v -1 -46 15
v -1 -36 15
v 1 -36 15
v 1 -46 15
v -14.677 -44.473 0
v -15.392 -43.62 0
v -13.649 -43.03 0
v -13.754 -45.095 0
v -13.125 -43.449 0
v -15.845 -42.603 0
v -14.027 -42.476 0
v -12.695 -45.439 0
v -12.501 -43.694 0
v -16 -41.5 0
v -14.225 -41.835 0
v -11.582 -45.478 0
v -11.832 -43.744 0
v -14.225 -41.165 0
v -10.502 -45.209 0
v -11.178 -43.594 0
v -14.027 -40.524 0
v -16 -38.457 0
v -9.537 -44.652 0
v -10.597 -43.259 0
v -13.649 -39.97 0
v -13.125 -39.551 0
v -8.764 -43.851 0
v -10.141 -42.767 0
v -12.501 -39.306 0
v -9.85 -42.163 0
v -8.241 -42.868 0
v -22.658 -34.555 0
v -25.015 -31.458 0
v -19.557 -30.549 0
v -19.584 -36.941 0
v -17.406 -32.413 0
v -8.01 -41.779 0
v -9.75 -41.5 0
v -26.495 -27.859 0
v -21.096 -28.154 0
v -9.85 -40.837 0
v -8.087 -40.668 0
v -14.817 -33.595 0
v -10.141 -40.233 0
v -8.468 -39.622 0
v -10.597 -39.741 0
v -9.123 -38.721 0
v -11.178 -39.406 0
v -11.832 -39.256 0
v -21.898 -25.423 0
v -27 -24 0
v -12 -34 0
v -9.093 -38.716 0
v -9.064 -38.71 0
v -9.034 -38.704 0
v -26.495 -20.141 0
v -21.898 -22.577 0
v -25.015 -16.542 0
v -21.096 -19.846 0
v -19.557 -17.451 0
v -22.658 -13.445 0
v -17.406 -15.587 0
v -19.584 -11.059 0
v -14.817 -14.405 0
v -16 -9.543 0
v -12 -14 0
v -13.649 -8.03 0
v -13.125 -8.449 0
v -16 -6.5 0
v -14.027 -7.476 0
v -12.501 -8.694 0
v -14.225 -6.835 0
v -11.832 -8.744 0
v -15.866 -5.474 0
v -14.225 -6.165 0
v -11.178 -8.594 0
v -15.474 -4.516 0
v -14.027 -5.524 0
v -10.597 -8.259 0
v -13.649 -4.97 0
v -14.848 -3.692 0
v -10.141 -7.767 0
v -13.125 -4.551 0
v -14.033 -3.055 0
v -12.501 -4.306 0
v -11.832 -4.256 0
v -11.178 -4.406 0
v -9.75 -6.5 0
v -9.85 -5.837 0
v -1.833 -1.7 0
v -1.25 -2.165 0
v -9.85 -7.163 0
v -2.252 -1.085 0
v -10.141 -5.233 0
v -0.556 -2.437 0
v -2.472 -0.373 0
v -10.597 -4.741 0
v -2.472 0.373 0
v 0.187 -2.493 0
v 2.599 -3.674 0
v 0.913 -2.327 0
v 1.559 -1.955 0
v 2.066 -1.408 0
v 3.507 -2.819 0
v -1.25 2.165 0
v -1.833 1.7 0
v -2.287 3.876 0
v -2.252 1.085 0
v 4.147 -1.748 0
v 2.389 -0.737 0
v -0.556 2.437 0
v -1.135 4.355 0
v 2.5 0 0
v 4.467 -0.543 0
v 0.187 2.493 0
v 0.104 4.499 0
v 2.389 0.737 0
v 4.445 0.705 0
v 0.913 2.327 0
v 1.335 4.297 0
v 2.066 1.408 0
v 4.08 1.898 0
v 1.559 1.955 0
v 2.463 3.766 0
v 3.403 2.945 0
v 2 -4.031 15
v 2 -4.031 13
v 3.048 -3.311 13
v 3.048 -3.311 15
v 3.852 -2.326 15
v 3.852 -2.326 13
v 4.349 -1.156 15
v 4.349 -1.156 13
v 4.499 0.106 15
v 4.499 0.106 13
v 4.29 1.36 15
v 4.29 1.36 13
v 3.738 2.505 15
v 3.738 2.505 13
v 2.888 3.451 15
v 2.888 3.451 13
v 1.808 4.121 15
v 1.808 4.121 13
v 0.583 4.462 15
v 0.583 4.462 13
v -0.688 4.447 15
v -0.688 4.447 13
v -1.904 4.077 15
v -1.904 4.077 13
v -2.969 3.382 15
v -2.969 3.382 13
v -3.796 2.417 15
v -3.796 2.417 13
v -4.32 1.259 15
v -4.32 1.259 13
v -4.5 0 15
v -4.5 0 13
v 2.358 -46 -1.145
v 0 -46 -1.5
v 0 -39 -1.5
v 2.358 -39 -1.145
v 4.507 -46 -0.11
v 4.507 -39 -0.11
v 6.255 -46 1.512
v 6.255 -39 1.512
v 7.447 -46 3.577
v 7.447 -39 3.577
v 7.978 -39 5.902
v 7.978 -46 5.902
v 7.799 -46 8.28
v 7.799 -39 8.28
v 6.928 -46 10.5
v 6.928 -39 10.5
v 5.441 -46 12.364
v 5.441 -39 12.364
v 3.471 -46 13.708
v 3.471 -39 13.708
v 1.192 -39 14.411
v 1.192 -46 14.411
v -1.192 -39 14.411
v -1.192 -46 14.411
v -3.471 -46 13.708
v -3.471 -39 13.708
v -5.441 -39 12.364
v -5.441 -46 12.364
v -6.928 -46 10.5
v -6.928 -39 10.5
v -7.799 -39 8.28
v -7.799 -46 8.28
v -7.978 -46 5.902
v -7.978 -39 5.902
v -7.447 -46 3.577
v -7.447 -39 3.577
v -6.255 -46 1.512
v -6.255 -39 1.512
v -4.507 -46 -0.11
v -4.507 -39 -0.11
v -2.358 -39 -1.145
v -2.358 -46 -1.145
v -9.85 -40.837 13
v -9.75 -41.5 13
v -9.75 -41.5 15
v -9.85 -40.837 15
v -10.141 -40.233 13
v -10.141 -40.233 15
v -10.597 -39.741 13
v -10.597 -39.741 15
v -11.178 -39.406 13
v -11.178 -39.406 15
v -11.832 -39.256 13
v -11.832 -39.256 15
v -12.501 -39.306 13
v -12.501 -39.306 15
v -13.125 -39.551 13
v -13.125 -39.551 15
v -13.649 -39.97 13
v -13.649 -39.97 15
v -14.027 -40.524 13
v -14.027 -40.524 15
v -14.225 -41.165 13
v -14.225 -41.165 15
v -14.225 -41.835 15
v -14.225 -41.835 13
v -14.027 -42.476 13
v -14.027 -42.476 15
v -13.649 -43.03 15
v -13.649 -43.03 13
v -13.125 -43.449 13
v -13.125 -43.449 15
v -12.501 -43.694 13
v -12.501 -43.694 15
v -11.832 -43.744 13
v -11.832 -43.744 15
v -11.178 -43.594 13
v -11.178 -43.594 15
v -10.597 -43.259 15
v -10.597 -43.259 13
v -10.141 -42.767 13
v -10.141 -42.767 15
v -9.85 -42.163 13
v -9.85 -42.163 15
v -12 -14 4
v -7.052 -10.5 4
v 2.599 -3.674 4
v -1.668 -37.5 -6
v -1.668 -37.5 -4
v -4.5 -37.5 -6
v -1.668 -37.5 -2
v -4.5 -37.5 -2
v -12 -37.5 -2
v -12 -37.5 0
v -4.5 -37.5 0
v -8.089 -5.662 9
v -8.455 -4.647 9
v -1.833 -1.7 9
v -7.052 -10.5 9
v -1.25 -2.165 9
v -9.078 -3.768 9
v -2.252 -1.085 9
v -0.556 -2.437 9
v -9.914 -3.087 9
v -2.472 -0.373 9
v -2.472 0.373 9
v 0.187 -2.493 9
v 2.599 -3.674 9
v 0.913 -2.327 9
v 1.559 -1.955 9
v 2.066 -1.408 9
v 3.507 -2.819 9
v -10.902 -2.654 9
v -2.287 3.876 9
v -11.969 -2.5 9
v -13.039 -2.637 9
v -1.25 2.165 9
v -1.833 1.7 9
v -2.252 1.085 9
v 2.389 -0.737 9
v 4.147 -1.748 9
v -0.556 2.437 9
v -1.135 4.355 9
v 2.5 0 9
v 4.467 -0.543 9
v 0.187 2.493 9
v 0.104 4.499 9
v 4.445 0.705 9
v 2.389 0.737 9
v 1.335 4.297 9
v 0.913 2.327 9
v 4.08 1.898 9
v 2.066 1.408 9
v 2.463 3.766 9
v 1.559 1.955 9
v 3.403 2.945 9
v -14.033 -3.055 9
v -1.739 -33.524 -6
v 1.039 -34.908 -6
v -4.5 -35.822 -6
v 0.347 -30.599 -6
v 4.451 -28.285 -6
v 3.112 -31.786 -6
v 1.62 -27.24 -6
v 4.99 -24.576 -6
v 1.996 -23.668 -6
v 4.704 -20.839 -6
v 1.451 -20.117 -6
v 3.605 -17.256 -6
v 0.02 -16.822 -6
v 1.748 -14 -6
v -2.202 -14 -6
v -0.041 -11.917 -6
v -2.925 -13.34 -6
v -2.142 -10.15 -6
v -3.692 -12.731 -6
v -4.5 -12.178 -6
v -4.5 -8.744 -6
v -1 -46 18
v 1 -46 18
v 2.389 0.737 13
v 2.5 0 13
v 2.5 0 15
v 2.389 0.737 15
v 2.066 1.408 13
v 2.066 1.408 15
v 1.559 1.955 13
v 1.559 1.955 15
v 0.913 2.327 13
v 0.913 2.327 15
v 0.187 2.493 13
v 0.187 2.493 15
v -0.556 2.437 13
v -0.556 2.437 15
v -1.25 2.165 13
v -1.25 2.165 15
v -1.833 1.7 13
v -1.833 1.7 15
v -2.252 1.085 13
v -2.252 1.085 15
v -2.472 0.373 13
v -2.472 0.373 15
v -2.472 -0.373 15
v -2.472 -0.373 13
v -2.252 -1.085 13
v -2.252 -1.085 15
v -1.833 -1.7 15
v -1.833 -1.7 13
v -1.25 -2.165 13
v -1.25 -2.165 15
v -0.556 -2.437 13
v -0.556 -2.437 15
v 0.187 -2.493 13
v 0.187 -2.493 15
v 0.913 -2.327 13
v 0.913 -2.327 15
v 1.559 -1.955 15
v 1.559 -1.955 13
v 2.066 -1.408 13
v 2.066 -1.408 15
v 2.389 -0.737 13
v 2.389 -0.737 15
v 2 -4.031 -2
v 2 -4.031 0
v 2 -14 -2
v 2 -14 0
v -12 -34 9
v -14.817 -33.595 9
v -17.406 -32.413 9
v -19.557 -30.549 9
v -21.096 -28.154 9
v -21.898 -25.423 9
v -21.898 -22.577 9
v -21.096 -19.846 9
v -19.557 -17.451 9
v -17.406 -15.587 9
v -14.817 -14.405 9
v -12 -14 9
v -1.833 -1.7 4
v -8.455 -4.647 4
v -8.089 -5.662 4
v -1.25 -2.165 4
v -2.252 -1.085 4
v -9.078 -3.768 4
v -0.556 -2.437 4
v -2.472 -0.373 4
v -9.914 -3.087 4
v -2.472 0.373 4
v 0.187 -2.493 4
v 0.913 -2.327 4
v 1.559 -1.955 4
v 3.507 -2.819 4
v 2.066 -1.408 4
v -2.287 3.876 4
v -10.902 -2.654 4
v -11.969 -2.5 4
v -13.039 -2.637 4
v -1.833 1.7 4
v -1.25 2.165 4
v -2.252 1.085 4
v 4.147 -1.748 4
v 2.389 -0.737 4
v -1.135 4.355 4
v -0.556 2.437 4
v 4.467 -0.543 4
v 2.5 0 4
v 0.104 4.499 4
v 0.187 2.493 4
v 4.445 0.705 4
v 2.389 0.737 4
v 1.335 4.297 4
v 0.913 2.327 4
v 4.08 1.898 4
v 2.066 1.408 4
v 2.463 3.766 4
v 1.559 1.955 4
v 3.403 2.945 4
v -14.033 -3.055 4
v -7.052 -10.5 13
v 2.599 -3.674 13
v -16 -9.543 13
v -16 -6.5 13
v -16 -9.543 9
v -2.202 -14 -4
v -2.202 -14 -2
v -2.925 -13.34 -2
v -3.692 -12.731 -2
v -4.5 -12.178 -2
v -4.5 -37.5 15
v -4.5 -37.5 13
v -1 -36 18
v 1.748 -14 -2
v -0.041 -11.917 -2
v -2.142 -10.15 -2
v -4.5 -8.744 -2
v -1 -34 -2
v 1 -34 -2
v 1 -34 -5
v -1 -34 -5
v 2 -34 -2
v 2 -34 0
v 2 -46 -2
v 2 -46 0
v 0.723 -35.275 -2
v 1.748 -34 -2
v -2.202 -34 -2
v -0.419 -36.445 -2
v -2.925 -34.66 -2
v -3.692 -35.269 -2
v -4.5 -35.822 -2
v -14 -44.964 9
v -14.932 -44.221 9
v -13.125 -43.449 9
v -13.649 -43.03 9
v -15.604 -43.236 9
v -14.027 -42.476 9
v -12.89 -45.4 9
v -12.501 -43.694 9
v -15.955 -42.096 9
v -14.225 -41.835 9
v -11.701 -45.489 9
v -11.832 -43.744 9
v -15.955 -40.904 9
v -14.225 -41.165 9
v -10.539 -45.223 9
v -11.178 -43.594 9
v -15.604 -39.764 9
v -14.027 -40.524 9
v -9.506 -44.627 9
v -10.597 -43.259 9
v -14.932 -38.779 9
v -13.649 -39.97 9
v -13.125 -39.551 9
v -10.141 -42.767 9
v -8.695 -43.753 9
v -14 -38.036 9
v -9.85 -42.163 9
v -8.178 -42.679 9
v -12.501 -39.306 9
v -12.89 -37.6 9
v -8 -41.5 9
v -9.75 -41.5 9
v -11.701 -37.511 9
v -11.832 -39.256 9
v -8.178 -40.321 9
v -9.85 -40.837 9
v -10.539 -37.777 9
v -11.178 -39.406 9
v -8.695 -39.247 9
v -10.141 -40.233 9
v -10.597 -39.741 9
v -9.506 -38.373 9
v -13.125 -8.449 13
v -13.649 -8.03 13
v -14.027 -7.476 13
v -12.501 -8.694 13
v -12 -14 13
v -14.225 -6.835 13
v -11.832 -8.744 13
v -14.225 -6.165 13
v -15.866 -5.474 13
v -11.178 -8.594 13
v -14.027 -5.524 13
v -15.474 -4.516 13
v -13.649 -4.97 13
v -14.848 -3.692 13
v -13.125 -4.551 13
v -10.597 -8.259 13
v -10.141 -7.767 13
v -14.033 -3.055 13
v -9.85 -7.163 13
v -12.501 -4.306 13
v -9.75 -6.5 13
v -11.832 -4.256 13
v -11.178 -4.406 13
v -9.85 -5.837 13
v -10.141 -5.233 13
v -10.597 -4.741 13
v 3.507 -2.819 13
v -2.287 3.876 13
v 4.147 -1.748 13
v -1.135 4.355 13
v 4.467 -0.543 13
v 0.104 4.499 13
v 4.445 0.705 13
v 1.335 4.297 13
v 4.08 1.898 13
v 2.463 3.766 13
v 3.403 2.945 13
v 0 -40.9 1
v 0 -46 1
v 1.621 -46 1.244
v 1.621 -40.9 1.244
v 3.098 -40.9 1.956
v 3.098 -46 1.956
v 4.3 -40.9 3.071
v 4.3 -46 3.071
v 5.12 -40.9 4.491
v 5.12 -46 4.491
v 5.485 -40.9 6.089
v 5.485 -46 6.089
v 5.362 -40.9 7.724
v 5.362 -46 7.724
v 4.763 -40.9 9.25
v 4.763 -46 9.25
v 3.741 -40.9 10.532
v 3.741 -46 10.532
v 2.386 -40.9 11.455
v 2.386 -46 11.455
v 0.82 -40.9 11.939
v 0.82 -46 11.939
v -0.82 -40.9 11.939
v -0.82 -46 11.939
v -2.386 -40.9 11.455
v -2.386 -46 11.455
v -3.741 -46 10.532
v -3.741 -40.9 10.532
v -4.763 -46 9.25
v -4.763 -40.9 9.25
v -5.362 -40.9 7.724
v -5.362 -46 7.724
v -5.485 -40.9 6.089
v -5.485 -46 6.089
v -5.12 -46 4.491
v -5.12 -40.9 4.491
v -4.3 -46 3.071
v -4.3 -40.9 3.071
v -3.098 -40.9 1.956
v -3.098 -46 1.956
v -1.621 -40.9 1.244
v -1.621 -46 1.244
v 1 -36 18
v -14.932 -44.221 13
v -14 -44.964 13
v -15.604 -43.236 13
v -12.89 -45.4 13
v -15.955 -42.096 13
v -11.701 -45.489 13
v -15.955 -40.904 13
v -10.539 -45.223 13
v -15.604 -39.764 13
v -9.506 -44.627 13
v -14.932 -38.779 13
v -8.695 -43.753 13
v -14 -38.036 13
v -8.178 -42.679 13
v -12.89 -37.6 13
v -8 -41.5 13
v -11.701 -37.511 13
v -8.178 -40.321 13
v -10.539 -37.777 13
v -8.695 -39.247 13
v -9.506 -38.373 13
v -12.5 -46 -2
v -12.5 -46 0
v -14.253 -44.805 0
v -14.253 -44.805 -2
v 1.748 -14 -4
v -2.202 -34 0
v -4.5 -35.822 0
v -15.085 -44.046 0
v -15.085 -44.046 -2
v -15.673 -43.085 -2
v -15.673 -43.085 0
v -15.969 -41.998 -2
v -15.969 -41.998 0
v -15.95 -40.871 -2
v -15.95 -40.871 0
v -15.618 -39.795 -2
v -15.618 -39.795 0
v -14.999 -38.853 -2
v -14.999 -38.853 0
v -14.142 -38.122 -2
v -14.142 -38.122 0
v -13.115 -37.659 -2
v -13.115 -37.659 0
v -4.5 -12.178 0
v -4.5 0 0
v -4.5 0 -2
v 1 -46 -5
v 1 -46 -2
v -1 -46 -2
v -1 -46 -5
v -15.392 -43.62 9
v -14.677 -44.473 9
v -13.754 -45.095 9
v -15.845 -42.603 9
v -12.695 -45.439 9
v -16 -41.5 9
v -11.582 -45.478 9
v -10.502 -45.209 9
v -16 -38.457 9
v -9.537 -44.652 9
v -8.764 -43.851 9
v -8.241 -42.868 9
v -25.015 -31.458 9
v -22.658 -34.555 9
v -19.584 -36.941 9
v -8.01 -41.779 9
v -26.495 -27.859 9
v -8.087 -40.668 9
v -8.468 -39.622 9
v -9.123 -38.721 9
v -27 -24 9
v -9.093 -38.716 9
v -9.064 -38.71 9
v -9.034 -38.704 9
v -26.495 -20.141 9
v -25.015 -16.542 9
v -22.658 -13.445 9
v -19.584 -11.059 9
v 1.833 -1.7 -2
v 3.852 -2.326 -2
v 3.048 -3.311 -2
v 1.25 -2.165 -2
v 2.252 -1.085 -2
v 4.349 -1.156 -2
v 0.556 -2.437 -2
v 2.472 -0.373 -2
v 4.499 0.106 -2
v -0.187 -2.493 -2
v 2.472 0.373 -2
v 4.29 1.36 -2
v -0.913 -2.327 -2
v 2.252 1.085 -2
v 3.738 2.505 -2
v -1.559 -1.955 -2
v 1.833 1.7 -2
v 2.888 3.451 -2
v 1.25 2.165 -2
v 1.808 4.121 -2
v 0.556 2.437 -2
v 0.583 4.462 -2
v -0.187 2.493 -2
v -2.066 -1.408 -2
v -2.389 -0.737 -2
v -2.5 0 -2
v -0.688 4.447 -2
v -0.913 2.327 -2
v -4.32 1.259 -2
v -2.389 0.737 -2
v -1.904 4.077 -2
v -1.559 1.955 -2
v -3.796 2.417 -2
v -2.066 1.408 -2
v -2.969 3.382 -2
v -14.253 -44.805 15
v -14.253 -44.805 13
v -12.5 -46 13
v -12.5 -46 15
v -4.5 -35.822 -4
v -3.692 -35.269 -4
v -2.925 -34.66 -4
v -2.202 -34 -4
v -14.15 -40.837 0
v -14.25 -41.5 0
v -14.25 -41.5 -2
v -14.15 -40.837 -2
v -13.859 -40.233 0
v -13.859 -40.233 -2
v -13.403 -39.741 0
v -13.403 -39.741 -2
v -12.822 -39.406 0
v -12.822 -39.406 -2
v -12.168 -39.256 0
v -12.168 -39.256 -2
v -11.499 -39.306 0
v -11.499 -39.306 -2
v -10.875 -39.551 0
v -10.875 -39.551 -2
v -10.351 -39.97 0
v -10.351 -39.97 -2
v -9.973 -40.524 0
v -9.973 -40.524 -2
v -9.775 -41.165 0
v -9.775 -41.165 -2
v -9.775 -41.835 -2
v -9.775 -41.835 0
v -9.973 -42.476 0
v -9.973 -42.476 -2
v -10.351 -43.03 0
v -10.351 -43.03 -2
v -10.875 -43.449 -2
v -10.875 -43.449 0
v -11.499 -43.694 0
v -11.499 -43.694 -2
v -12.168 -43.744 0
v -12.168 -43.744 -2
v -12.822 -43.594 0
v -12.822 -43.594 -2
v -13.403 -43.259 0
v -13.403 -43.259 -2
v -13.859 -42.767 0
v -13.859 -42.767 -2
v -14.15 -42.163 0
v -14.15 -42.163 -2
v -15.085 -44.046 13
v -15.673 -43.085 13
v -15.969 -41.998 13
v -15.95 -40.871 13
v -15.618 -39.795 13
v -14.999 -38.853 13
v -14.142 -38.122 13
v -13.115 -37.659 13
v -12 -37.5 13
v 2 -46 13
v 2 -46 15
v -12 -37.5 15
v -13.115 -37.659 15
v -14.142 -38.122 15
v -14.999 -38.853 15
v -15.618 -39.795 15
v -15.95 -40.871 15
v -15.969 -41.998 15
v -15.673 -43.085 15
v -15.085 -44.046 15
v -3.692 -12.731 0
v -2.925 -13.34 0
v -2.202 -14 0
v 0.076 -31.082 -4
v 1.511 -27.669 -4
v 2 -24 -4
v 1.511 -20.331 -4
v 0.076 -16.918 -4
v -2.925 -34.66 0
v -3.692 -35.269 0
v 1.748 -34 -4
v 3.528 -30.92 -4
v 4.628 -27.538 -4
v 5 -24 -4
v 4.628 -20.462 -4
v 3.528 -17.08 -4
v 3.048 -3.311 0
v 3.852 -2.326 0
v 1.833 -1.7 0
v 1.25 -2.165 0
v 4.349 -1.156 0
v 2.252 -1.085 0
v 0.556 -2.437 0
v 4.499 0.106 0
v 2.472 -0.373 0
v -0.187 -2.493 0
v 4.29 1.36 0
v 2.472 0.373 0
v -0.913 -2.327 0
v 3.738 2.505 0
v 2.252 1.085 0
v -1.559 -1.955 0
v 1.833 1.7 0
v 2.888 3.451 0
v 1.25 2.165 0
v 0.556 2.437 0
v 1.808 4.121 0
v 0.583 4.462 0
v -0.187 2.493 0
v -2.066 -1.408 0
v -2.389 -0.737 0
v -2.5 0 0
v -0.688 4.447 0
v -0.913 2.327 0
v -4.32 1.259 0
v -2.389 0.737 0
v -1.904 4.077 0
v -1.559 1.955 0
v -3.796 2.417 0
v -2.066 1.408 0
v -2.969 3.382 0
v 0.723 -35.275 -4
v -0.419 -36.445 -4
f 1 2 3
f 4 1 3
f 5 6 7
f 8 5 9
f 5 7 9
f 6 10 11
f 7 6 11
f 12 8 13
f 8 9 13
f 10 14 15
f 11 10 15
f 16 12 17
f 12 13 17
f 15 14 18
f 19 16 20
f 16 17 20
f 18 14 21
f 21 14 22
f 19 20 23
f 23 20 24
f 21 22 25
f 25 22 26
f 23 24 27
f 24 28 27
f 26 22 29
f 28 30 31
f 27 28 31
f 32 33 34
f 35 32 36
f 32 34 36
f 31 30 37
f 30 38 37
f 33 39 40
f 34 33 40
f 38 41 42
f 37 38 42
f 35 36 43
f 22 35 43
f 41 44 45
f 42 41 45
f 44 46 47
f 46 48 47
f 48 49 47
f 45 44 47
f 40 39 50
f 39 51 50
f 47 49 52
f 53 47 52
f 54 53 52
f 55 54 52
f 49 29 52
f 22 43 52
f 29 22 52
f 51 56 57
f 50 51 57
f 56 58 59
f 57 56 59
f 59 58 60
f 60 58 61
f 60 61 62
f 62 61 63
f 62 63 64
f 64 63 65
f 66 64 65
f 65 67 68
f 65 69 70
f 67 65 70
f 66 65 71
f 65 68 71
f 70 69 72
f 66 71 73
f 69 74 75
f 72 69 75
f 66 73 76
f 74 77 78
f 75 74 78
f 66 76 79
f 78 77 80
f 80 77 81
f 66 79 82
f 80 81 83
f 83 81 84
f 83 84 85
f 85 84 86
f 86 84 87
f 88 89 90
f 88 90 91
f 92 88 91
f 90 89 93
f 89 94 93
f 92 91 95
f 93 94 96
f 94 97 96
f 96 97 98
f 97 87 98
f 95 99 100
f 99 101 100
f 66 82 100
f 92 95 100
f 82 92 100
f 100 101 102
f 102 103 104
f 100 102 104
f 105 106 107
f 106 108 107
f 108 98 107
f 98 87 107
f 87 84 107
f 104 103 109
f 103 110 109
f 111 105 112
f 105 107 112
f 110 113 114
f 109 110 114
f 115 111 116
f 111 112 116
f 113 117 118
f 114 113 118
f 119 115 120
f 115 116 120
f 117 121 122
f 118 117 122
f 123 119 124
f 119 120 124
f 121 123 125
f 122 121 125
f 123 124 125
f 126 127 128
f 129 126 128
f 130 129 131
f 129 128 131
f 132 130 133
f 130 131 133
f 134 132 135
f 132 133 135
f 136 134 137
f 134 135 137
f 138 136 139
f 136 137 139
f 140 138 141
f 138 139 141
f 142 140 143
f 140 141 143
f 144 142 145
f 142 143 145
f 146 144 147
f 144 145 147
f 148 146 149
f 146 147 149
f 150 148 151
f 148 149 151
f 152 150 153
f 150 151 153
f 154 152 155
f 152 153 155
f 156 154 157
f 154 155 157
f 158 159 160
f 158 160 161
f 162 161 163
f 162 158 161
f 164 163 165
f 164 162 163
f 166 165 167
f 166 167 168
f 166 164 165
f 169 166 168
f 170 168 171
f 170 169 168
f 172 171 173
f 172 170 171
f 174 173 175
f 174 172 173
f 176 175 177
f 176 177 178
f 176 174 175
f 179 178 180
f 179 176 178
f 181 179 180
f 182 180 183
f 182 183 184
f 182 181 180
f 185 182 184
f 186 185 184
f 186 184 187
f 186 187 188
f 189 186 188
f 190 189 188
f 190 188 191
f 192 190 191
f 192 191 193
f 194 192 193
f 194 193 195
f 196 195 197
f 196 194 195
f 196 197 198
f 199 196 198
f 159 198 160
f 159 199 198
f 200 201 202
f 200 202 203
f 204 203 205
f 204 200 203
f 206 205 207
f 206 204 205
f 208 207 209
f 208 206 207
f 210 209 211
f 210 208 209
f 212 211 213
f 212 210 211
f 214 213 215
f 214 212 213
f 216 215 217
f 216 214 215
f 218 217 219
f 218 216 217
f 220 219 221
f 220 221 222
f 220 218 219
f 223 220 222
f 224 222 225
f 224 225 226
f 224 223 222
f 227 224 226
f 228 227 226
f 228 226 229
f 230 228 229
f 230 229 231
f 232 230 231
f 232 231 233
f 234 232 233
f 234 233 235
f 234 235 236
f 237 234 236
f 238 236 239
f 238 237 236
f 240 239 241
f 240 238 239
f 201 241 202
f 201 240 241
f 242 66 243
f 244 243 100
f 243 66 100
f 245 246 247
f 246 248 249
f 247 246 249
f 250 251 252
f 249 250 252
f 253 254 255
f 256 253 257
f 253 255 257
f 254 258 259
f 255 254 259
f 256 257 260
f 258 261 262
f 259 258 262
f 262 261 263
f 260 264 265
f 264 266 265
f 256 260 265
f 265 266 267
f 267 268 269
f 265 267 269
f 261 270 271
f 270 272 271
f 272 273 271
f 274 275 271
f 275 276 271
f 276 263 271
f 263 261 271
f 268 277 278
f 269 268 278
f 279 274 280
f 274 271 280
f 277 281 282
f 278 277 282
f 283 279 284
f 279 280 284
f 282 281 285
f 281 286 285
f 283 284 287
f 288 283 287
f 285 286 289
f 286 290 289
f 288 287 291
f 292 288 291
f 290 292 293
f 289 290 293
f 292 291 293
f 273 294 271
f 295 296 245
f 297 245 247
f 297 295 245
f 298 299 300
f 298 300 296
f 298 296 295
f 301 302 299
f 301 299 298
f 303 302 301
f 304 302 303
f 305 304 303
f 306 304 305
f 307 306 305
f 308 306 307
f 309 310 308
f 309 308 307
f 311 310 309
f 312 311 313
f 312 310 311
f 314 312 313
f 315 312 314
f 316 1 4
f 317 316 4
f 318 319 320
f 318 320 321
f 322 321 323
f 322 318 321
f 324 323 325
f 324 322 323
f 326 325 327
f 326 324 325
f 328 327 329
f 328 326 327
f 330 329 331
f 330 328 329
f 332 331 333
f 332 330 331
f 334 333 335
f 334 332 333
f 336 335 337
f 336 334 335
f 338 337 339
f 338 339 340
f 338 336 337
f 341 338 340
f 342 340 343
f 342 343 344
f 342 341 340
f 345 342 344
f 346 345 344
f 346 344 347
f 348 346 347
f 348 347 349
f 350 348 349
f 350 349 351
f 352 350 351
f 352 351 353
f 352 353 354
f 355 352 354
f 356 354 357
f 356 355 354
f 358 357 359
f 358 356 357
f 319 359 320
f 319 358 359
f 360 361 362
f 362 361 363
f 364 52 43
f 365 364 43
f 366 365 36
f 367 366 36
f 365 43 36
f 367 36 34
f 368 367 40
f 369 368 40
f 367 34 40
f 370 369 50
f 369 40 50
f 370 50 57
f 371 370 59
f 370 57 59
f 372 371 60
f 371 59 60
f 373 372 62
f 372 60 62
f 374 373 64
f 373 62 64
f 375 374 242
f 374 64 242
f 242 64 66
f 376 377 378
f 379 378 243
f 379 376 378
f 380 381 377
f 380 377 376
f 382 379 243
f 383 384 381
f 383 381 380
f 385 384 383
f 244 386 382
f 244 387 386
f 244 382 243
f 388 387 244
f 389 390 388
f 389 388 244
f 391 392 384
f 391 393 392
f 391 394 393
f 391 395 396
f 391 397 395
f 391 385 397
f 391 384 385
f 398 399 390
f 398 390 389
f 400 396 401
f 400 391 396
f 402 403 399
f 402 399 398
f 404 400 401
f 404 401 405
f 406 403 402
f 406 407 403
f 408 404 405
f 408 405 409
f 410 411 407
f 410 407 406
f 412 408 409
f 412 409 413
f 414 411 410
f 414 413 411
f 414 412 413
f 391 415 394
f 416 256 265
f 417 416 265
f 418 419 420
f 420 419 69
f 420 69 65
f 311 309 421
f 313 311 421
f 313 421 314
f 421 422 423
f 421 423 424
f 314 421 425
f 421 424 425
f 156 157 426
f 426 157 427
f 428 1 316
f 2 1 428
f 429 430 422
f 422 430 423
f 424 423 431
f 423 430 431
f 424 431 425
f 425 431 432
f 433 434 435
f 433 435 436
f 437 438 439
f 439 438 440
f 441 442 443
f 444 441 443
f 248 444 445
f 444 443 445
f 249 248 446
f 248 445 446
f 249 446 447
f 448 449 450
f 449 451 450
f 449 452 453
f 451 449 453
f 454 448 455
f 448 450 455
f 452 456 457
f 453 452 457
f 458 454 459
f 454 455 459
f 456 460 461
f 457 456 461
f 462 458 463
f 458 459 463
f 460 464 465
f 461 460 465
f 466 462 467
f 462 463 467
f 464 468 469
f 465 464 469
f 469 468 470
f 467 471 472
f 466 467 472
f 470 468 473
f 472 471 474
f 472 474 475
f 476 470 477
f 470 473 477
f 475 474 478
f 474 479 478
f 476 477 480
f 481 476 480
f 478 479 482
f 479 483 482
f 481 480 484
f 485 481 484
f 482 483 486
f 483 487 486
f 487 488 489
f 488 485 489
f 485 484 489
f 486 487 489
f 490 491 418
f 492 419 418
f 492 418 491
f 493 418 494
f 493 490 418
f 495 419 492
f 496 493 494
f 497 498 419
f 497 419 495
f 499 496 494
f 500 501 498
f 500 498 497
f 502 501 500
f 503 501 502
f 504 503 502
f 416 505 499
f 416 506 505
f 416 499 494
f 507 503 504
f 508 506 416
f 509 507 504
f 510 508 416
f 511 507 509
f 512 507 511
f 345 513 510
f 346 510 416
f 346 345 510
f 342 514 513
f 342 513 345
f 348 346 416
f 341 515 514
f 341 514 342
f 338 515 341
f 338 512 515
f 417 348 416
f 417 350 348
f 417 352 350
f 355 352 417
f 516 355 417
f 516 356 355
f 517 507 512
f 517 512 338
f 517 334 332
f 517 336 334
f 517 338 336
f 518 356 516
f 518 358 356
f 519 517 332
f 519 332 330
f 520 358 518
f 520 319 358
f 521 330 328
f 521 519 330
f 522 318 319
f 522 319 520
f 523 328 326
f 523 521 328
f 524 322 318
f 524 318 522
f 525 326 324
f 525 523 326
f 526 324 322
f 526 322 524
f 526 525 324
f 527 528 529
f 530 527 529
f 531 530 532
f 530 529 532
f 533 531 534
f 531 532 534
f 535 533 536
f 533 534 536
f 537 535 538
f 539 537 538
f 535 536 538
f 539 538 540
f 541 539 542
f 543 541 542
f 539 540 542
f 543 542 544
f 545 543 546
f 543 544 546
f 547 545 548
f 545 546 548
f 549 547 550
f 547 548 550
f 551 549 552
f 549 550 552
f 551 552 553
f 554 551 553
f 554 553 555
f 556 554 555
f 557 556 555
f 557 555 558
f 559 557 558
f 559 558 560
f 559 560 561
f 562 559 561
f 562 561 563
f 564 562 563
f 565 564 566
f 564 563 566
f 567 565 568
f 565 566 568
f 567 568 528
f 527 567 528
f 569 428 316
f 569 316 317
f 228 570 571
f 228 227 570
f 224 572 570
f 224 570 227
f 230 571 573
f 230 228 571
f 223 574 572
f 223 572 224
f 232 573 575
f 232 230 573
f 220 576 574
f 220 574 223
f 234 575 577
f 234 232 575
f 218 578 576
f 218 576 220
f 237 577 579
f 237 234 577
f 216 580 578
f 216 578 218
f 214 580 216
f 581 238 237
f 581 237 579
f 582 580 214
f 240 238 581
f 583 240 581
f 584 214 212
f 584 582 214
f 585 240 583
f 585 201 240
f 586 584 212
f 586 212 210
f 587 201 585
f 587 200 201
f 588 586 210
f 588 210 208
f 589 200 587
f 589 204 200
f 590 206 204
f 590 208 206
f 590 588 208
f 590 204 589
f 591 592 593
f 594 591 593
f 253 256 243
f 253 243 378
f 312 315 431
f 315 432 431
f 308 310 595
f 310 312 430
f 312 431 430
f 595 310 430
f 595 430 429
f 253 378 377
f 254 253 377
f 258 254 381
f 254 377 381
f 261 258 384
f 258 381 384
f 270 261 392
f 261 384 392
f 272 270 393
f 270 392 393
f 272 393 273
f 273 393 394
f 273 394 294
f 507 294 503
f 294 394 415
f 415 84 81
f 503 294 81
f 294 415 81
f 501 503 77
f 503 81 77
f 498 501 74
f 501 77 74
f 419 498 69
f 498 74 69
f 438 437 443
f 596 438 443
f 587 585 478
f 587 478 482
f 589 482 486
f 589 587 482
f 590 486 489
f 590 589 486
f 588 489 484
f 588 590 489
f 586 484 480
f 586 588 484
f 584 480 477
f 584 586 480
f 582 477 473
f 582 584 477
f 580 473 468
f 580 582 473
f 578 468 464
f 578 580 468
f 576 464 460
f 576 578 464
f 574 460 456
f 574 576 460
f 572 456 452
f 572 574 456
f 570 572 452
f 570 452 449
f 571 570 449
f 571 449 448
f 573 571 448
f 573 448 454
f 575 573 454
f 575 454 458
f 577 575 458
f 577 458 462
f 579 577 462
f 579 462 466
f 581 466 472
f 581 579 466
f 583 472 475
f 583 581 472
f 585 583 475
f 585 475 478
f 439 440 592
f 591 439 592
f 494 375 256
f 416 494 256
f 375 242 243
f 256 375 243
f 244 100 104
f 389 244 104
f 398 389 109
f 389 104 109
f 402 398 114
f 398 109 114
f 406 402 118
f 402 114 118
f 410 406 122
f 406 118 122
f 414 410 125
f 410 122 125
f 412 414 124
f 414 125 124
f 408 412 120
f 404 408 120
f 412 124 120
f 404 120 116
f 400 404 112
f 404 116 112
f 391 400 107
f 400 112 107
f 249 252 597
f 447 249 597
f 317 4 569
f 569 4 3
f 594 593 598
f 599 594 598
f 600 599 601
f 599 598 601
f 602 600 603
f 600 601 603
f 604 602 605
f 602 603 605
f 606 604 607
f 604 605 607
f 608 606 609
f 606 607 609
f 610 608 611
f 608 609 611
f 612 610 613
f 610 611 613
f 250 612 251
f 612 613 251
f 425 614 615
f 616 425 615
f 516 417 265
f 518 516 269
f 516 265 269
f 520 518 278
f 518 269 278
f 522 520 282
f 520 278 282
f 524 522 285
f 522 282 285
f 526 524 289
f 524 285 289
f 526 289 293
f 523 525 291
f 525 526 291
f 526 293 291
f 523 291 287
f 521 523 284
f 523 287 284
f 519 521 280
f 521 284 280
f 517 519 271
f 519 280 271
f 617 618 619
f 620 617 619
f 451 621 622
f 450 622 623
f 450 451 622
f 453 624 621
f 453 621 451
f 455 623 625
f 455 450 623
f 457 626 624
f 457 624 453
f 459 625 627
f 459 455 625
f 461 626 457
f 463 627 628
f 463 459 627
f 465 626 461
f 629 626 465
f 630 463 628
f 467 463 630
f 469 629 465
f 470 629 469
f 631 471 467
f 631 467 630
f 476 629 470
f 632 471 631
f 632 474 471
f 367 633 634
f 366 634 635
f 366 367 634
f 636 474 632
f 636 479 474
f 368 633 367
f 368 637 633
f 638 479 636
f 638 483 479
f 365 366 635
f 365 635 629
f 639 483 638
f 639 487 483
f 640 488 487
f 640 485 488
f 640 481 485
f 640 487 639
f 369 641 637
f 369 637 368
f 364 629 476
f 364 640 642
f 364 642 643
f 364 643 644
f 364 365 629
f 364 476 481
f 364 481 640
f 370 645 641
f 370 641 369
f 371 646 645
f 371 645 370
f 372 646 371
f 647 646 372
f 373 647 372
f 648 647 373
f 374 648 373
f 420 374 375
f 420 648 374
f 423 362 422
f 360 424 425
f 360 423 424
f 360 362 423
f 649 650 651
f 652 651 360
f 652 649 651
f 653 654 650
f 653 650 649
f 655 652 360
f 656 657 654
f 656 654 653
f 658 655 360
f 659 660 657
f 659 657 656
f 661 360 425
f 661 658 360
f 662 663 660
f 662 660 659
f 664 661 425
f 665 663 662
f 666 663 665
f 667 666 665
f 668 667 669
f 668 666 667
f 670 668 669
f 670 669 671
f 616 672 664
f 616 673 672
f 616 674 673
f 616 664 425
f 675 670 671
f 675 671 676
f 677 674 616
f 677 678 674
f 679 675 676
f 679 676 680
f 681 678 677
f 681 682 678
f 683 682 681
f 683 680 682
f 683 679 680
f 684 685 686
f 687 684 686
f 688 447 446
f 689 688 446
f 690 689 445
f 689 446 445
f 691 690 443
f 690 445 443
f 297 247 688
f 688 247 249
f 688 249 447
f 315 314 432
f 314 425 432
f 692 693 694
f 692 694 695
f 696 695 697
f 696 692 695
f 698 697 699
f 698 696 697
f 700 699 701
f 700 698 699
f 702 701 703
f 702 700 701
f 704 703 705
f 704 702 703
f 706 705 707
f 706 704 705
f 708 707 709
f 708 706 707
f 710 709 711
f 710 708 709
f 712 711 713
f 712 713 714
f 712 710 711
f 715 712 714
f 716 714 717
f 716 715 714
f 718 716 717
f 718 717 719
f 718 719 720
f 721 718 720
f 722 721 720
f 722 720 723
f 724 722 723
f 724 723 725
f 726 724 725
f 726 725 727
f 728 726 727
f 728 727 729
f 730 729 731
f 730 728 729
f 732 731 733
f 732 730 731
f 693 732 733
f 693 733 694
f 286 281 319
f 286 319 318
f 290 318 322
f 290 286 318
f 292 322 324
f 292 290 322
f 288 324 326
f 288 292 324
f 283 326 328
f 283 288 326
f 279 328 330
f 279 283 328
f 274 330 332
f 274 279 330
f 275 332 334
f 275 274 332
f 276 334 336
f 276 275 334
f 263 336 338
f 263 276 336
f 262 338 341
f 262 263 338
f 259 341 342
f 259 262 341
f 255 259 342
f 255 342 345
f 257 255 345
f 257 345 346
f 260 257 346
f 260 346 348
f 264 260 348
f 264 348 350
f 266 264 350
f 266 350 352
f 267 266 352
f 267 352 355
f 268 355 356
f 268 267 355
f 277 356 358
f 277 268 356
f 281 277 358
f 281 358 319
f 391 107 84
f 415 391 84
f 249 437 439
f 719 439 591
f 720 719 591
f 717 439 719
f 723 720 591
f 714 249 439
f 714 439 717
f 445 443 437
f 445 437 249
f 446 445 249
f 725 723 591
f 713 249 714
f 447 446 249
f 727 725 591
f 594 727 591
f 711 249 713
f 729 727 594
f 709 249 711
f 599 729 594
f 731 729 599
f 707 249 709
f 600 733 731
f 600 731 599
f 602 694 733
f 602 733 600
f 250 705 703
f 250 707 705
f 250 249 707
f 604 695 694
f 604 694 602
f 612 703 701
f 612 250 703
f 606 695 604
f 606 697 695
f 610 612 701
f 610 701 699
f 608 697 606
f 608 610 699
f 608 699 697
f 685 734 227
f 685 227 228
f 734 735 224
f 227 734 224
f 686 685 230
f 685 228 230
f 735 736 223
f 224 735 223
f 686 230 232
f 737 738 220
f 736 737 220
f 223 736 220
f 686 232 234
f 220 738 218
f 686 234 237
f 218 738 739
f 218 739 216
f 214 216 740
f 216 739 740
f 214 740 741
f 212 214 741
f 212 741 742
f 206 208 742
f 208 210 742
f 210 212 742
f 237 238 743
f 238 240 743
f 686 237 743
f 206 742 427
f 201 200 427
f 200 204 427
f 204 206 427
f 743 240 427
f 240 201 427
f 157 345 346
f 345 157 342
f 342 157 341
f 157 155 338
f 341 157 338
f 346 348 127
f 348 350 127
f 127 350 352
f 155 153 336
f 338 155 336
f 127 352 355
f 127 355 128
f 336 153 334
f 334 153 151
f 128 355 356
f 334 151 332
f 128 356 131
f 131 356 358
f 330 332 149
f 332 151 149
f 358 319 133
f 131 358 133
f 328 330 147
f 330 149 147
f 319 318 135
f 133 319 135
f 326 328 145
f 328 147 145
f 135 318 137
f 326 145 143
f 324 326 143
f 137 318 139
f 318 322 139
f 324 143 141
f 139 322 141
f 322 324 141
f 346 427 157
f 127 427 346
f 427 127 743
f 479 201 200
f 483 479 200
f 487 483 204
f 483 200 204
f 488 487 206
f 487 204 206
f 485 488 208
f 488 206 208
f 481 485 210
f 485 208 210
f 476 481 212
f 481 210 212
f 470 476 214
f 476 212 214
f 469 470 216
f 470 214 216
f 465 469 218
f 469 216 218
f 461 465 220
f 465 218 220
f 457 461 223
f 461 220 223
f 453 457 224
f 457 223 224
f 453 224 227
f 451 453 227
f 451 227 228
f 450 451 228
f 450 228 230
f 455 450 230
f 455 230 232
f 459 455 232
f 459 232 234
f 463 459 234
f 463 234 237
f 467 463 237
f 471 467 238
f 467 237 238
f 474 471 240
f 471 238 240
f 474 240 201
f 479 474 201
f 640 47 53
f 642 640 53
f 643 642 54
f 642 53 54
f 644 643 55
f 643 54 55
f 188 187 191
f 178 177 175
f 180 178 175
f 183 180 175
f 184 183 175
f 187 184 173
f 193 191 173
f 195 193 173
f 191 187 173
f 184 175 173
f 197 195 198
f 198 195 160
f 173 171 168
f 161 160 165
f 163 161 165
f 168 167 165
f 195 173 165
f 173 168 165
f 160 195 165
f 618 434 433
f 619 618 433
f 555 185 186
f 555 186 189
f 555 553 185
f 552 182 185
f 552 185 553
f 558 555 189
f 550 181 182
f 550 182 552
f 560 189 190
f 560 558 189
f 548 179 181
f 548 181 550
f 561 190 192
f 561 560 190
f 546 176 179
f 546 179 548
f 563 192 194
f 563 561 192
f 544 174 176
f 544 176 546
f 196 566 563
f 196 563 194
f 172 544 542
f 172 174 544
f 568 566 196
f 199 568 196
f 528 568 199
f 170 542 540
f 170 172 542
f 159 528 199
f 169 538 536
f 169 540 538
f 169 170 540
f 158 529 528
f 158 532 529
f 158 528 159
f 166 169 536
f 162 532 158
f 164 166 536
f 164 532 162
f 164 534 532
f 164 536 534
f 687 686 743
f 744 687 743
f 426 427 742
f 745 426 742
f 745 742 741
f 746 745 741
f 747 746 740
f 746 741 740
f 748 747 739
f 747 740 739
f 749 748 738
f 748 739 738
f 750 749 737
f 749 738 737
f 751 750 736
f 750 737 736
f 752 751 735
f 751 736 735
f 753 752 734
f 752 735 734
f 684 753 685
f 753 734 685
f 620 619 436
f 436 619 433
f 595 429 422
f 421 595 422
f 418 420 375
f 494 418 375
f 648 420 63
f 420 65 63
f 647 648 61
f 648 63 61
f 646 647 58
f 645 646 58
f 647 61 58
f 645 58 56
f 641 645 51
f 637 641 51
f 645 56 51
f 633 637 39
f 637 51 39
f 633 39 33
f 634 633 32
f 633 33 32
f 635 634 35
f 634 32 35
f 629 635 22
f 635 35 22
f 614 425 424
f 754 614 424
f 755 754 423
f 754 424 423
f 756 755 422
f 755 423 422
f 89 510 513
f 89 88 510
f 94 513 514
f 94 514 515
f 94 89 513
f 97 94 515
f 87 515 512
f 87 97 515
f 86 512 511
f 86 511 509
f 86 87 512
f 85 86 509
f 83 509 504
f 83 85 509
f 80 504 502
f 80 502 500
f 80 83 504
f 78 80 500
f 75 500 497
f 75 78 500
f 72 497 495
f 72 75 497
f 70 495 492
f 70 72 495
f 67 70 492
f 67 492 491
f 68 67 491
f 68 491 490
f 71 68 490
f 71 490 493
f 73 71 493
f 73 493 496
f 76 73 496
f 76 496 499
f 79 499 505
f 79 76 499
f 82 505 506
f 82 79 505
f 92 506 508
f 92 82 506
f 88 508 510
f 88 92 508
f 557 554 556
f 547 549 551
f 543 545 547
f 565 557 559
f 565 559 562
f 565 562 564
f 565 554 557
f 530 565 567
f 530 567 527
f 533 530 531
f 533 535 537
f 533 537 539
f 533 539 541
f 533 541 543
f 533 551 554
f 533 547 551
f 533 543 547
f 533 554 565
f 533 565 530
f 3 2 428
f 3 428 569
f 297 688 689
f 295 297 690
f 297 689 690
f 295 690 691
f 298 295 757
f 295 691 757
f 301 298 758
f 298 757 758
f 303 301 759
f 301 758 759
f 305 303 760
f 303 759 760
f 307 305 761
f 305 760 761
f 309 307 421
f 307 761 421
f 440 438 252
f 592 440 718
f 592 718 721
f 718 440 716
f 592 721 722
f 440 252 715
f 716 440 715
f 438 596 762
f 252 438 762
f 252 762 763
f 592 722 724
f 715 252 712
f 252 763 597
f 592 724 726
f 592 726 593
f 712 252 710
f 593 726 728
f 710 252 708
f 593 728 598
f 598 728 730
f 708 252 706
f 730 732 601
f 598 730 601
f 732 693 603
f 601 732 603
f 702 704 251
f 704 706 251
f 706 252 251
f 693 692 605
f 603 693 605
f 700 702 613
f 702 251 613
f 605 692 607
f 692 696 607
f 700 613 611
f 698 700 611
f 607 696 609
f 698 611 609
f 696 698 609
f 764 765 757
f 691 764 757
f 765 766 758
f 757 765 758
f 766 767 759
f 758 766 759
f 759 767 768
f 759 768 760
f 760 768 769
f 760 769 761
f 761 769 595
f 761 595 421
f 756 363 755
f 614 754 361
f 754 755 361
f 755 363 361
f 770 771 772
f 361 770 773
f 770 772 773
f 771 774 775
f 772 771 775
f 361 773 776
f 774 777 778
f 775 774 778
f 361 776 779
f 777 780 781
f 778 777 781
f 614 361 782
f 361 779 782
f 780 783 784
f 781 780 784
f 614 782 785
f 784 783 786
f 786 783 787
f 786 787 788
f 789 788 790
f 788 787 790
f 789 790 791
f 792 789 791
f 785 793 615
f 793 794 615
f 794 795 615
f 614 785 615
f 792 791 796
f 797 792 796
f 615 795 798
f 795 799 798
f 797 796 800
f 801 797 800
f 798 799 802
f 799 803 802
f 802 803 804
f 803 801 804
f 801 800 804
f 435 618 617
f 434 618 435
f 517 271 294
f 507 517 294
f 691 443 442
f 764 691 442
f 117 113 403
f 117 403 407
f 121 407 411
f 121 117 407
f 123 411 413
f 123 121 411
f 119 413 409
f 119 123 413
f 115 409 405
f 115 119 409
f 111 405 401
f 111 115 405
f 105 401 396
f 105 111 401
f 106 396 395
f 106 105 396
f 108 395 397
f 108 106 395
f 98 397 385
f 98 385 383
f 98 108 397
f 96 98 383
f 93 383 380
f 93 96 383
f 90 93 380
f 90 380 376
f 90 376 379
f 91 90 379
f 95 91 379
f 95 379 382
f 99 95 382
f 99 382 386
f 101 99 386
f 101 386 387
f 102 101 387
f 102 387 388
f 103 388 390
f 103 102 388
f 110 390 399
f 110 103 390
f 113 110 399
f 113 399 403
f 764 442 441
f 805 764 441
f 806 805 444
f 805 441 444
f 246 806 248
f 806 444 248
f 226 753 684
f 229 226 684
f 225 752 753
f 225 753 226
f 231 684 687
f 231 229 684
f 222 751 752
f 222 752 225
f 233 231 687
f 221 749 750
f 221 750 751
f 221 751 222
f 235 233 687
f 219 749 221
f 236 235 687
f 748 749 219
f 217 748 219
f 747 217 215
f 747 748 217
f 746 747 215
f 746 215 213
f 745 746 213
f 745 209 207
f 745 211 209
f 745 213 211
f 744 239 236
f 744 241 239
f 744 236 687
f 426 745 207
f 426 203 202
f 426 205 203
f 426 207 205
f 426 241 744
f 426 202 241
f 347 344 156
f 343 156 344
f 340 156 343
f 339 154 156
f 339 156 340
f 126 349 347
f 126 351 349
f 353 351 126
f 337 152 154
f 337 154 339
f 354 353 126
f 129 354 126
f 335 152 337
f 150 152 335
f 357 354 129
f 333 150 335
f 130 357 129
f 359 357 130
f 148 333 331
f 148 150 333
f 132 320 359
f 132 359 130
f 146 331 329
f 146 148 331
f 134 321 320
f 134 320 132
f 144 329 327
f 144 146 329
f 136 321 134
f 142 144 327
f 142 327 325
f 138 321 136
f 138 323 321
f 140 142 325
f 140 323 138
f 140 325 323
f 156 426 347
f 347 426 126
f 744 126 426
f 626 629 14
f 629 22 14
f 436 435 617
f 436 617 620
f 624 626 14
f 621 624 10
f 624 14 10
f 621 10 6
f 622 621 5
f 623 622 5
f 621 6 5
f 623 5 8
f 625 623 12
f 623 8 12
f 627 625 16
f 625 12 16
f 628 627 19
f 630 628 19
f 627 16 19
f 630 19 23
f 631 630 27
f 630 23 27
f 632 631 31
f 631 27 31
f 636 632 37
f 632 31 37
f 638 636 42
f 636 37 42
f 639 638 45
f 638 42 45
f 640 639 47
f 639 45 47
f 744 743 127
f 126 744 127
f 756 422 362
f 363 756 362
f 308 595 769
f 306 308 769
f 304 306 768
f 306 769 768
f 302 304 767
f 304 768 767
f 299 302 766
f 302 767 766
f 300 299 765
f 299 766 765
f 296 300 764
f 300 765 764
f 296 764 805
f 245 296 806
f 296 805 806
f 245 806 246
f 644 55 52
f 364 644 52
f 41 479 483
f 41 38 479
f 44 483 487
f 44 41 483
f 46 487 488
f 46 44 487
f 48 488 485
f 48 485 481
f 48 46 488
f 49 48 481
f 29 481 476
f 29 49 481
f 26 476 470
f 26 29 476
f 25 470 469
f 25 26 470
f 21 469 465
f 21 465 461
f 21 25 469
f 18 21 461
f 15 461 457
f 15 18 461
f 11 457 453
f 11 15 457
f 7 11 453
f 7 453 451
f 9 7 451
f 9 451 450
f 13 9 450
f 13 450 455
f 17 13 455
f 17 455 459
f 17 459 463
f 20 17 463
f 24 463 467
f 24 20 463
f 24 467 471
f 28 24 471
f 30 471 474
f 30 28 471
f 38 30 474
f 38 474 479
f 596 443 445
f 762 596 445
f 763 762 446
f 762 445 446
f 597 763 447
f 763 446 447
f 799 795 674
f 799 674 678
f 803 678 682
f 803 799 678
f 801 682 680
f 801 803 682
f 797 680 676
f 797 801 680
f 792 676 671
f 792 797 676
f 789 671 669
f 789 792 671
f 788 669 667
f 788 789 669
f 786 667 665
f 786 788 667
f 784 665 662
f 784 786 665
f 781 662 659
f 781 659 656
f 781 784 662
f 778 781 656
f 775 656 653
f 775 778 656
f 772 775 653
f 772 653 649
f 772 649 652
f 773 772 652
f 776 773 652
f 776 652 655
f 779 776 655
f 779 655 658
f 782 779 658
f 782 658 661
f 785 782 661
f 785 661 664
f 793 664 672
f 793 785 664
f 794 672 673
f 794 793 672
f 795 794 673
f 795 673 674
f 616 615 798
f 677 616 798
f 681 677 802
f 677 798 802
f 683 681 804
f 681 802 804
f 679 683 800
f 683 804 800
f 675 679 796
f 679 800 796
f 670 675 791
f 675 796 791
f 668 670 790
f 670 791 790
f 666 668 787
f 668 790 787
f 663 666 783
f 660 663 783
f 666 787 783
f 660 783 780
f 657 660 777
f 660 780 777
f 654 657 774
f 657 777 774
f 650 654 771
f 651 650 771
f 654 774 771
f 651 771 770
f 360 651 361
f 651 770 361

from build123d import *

# Parameters (mm, degrees)
SKETCH_1_R          = 2.25
SKETCH_1_R_2        = 2.5
EXTRUDE_1_DEPTH     = 4
SKETCH_2_R          = 2.25
EXTRUDE_2_DEPTH     = 5
SKETCH_5_R          = 2.25
SKETCH_5_R_2        = 4.5
SKETCH_5_R_3        = 2.5
EXTRUDE_3_DEPTH     = 4
SKETCH_6_R          = 2.5
SKETCH_6_R_2        = 2.25
EXTRUDE_6_DEPTH     = 2
SKETCH_6_3_R        = 4
SKETCH_6_3_R_2      = 2.25
EXTRUDE_8_DEPTH     = 4
SKETCH_7_R          = 2.5
SKETCH_7_R_2        = 2.25
EXTRUDE_9_DEPTH     = 2
CUT_EXTRUDE_1_DEPTH = 2
EXTRUDE_10_DEPTH    = 2
EXTRUDE_10_2_DEPTH  = 2
EXTRUDE_11_DEPTH    = 2
SKETCH_12_R         = 8
EXTRUDE_12_DEPTH    = 7
SKETCH_13_R         = 5.5
CUT_EXTRUDE_2_DEPTH = 5.1
SKETCH_14_W         = 2
SKETCH_14_H         = 10
EXTRUDE_13_DEPTH    = 3
SKETCH_15_W         = 2
SKETCH_15_H         = 12
EXTRUDE_14_DEPTH    = 3


with BuildPart() as part:
    # Эскиз1 → Бобышка-Вытянуть1 (new body)
    with BuildSketch(Plane.XY):
        with BuildLine():
            Line((-2.286801689, 3.875633888), (-14.032712613, -3.0549921))
            ThreePointArc((-14.032712613, -3.0549921), (-15.473532097, -4.516423741), (-16, -6.5))
            Line((-16, -6.5), (-16, -9.543167705))
            ThreePointArc((-16, -9.543167705), (-27, -24), (-16, -38.456832295))
            Line((-16, -38.456832295), (-16, -41.5))
            ThreePointArc((-16, -41.5), (-10.501613617, -45.208751575), (-9.122580876, -38.721428571))
            ThreePointArc((-9.122580876, -38.721428571), (-9.078403799, -38.712724956), (-9.034253047, -38.703888772))
            Line((-9.034253047, -38.703888772), (-12, -34))
            ThreePointArc((-12, -34), (-22, -24), (-12, -14))
            Line((-12, -14), (2.598641026, -3.673835165))
            ThreePointArc((2.598641026, -3.673835165), (3.777953373, 2.44480435), (-2.286801689, 3.875633888))
        make_face()
        with Locations((-12, -41.5)):
            Circle(SKETCH_1_R, mode=Mode.SUBTRACT)
        with Locations((-12, -6.5)):
            Circle(SKETCH_1_R, mode=Mode.SUBTRACT)
        Circle(SKETCH_1_R_2, mode=Mode.SUBTRACT)
    extrude(amount=EXTRUDE_1_DEPTH)

    # Эскиз2 → Бобышка-Вытянуть2 (add)
    # profile 1 of 2: a face of its own
    with BuildSketch(Plane.XY.offset(4)):
        with BuildLine():
            Line((-7.05186636, -10.5), (-8.088820948, -5.66174084))
            ThreePointArc((-8.088820948, -5.66174084), (-8.022267215, -6.078524147), (-8, -6.5))
            ThreePointArc((-8, -6.5), (-12, -10.5), (-16, -6.5))
            Line((-16, -6.5), (-16, -9.543167705))
            ThreePointArc((-16, -9.543167705), (-27, -24), (-16, -38.456832295))
            Line((-16, -38.456832295), (-16, -41.5))
            ThreePointArc((-16, -41.5), (-10.501613617, -45.208751575), (-9.122580876, -38.721428571))
            ThreePointArc((-9.122580876, -38.721428571), (-9.078403799, -38.712724956), (-9.034253047, -38.703888772))
            Line((-9.034253047, -38.703888772), (-12, -34))
            ThreePointArc((-12, -34), (-22, -24), (-12, -14))
            Line((-12, -14), (-7.05186636, -10.5))
        make_face()
        with Locations((-12, -41.5)):
            Circle(SKETCH_2_R, mode=Mode.SUBTRACT)
    # profile 2 of 2: a face of its own
    with BuildSketch(Plane.XY.offset(4)):
        with BuildLine():
            ThreePointArc((-8, -6.5), (-8.022267215, -6.078524147), (-8.088820948, -5.66174084))
            ThreePointArc((-8.088820948, -5.66174084), (-10.393468397, -2.836797001), (-14.032712613, -3.0549921))
            ThreePointArc((-14.032712613, -3.0549921), (-15.473532097, -4.516423741), (-16, -6.5))
            ThreePointArc((-16, -6.5), (-12, -10.5), (-8, -6.5))
        make_face()
        with Locations((-12, -6.5)):
            Circle(SKETCH_2_R, mode=Mode.SUBTRACT)
    extrude(amount=EXTRUDE_2_DEPTH)

    # Эскиз5 → Бобышка-Вытянуть3 (add)
    # profile 1 of 4: a face of its own
    with BuildSketch(Plane.XY.offset(9)):
        with BuildLine():
            Line((-2.286801689, 3.875633888), (-14.032712613, -3.0549921))
            ThreePointArc((-14.032712613, -3.0549921), (-10.393468397, -2.836797001), (-8.088820948, -5.66174084))
            Line((-8.088820948, -5.66174084), (-7.05186636, -10.5))
            Line((-7.05186636, -10.5), (2.598641026, -3.673835165))
            ThreePointArc((2.598641026, -3.673835165), (-3.777953373, -2.44480435), (-2.286801689, 3.875633888))
        make_face()
    # profile 2 of 4: a face of its own
    with BuildSketch(Plane.XY.offset(9)):
        with BuildLine():
            ThreePointArc((-8.088820948, -5.66174084), (-10.393468397, -2.836797001), (-14.032712613, -3.0549921))
            ThreePointArc((-14.032712613, -3.0549921), (-15.473532097, -4.516423741), (-16, -6.5))
            ThreePointArc((-16, -6.5), (-12, -10.5), (-8, -6.5))
            ThreePointArc((-8, -6.5), (-8.022267215, -6.078524147), (-8.088820948, -5.66174084))
        make_face()
        with Locations((-12, -6.5)):
            Circle(SKETCH_5_R, mode=Mode.SUBTRACT)
    # profile 3 of 4: a face of its own
    with BuildSketch(Plane.XY.offset(9)):
        with BuildLine():
            Line((-7.05186636, -10.5), (-8.088820948, -5.66174084))
            ThreePointArc((-8.088820948, -5.66174084), (-8.022267215, -6.078524147), (-8, -6.5))
            ThreePointArc((-8, -6.5), (-12, -10.5), (-16, -6.5))
            Line((-16, -6.5), (-16, -9.543167705))
            Line((-16, -9.543167705), (-12, -14))
            Line((-12, -14), (-7.05186636, -10.5))
        make_face()
    # profile 4 of 4: a face of its own
    with BuildSketch(Plane.XY.offset(9)):
        Circle(SKETCH_5_R_2)
        Circle(SKETCH_5_R_3, mode=Mode.SUBTRACT)
    extrude(amount=EXTRUDE_3_DEPTH)


with BuildPart() as body_2:
    # Эскиз6 → Бобышка-Вытянуть6 (new body)
    with BuildSketch(Plane.XY.offset(13)):
        with BuildLine():
            ThreePointArc((2, -4.031128874), (2.371708245, 3.824264635), (-4.5, 0))
            Line((-4.5, 0), (-4.5, -37.5))
            Line((-4.5, -37.5), (-12, -37.5))
            ThreePointArc((-12, -37.5), (-15.822364985, -40.321218459), (-14.252866643, -44.80523704))
            Line((-14.252866643, -44.80523704), (-12.5, -46))
            Line((-12.5, -46), (2, -46))
            Line((2, -46), (2, -4.031128874))
        make_face()
        Circle(SKETCH_6_R, mode=Mode.SUBTRACT)
        with Locations((-12, -41.5)):
            Circle(SKETCH_6_R_2, mode=Mode.SUBTRACT)
    extrude(amount=EXTRUDE_6_DEPTH)


with BuildPart() as body_3:
    # Эскиз6<3> → Бобышка-Вытянуть8 (new body)
    with BuildSketch(Plane.XY.offset(13)):
        with Locations((-12, -41.5)):
            Circle(SKETCH_6_3_R)
        with Locations((-12, -41.5)):
            Circle(SKETCH_6_3_R_2, mode=Mode.SUBTRACT)
    extrude(amount=-EXTRUDE_8_DEPTH)


with BuildPart() as body_4:
    # Эскиз7 → Бобышка-Вытянуть9 (new body)
    with BuildSketch(Plane(origin=(0, 0, 0), x_dir=(-1, 0, 0), z_dir=(0, 0, -1))):
        with BuildLine():
            ThreePointArc((4.5, 0), (-2.371708245, 3.824264635), (-2, -4.031128874))
            Line((-2, -4.031128874), (-2, -46))
            Line((-2, -46), (12.5, -46))
            Line((12.5, -46), (14.252866643, -44.80523704))
            ThreePointArc((14.252866643, -44.80523704), (15.822364985, -40.321218459), (12, -37.5))
            Line((12, -37.5), (4.5, -37.5))
            Line((4.5, -37.5), (4.5, 0))
        make_face()
        Circle(SKETCH_7_R, mode=Mode.SUBTRACT)
        with Locations((12, -41.5)):
            Circle(SKETCH_7_R_2, mode=Mode.SUBTRACT)
    extrude(amount=EXTRUDE_9_DEPTH)

    # Эскиз9 → Вырез-Вытянуть1 (cut)
    with BuildSketch(Plane(origin=(0, 0, -2), x_dir=(-1, 0, 0), z_dir=(0, 0, -1))):
        with BuildLine():
            ThreePointArc((4.5, -12.178409582), (3.303196331, -13.028873989), (2.202041029, -14))
            ThreePointArc((2.202041029, -14), (-0.906808777, -18.576505997), (-2, -24))
            ThreePointArc((-2, -24), (-0.906808777, -29.423494003), (2.202041029, -34))
            ThreePointArc((2.202041029, -34), (3.303196331, -34.971126011), (4.5, -35.821590418))
            Line((4.5, -35.821590418), (4.5, -12.178409582))
        make_face()
        with BuildLine():
            Line((2.202041029, -14), (-2, -14))
            Line((-2, -14), (-2, -24))
            ThreePointArc((-2, -24), (-0.906808777, -18.576505997), (2.202041029, -14))
        make_face()
        with BuildLine():
            ThreePointArc((2.202041029, -34), (-0.906808777, -29.423494003), (-2, -24))
            Line((-2, -24), (-2, -34))
            Line((-2, -34), (2.202041029, -34))
        make_face()
    extrude(amount=-CUT_EXTRUDE_1_DEPTH, mode=Mode.SUBTRACT)


with BuildPart() as cut_extrude_1_piece_1:
    # of the separate pieces the step leaves, piece 1, a body of its own (cut_extrude_1_pieces)
    add(body_4.part.solids().sort_by_distance((-12, -37.5, 0))[0])


with BuildPart() as cut_extrude_1_piece_2:
    # of the separate pieces the step leaves, piece 2, a body of its own (cut_extrude_1_pieces)
    add(body_4.part.solids().sort_by_distance((-4.5, -12.178409582, 0))[0])


with BuildPart() as body_6:
    # Эскиз10 → Бобышка-Вытянуть10 (new body)
    with BuildSketch(Plane(origin=(0, 0, -2), x_dir=(-1, 0, 0), z_dir=(0, 0, -1))):
        with BuildLine():
            Line((1.66801084, -37.5), (4.5, -37.5))
            Line((4.5, -37.5), (4.5, -35.821590418))
            ThreePointArc((4.5, -35.821590418), (3.303196331, -34.971126011), (2.202041029, -34))
            Line((2.202041029, -34), (-1.747727085, -34))
            ThreePointArc((-1.747727085, -34), (-0.166375122, -35.873471118), (1.66801084, -37.5))
        make_face()
    extrude(amount=EXTRUDE_10_DEPTH)



with BuildPart() as body_7:
    # Эскиз10 → Extrude 10 2 (new body)
    with BuildSketch(Plane(origin=(0, 0, -2), x_dir=(-1, 0, 0), z_dir=(0, 0, -1))):
        with BuildLine():
            ThreePointArc((4.5, -8.743853698), (1.055903644, -10.99128158), (-1.747727085, -14))
            Line((-1.747727085, -14), (2.202041029, -14))
            ThreePointArc((2.202041029, -14), (3.303196331, -13.028873989), (4.5, -12.178409582))
            Line((4.5, -12.178409582), (4.5, -8.743853698))
        make_face()
    extrude(amount=EXTRUDE_10_2_DEPTH)


with BuildPart() as body_6_1:
    add(body_6.part)

    add(body_7.part)  # Бобышка-Вытянуть11 merges body 7
    # Эскиз11 → Бобышка-Вытянуть11 (add)
    with BuildSketch(Plane(origin=(0, 0, -4), x_dir=(-1, 0, 0), z_dir=(0, 0, -1))):
        with BuildLine():
            ThreePointArc((2.202041029, -14), (3.303196331, -13.028873989), (4.5, -12.178409582))
            Line((4.5, -12.178409582), (4.5, -8.743853698))
            ThreePointArc((4.5, -8.743853698), (1.055903644, -10.99128158), (-1.747727085, -14))
            Line((-1.747727085, -14), (2.202041029, -14))
        make_face()
        with BuildLine():
            Line((2.202041029, -14), (-1.747727085, -14))
            ThreePointArc((-1.747727085, -14), (-4.823218586, -26.445264074), (1.66801084, -37.5))
            Line((1.66801084, -37.5), (4.5, -37.5))
            Line((4.5, -37.5), (4.5, -35.821590418))
            ThreePointArc((4.5, -35.821590418), (-1.92301326, -25.466186131), (2.202041029, -14))
        make_face()
    extrude(amount=EXTRUDE_11_DEPTH)


with BuildPart() as body_7_2:
    # Эскиз12 → Бобышка-Вытянуть12 (new body)
    with BuildSketch(Plane.XZ.offset(46)):
        with Locations(Location((0, 6.5, 0), (0, 0, 270))):
            Circle(SKETCH_12_R)
    extrude(amount=-EXTRUDE_12_DEPTH)

    # Эскиз13 → Вырез-Вытянуть2 (cut)
    with BuildSketch(Plane.XZ.offset(46)):
        with Locations(Location((0, 6.5, 0), (0, 0, 270))):
            Circle(SKETCH_13_R)
    extrude(amount=-CUT_EXTRUDE_2_DEPTH, mode=Mode.SUBTRACT)


with BuildPart() as body_8:
    # Эскиз14 → Бобышка-Вытянуть13 (new body)
    with BuildSketch(Plane.XY.offset(15)):
        with Locations((0, -41)):
            Rectangle(SKETCH_14_W, SKETCH_14_H)
    extrude(amount=EXTRUDE_13_DEPTH)


with BuildPart() as body_9:
    # Эскиз15 → Бобышка-Вытянуть14 (new body)
    with BuildSketch(Plane(origin=(0, 0, -2), x_dir=(-1, 0, 0), z_dir=(0, 0, -1))):
        with Locations((0, -40)):
            Rectangle(SKETCH_15_W, SKETCH_15_H)
    extrude(amount=EXTRUDE_14_DEPTH)


solid = Compound([part.part, body_2.part, body_3.part, cut_extrude_1_piece_1.part, cut_extrude_1_piece_2.part, body_6_1.part, body_7_2.part, body_8.part, body_9.part])
